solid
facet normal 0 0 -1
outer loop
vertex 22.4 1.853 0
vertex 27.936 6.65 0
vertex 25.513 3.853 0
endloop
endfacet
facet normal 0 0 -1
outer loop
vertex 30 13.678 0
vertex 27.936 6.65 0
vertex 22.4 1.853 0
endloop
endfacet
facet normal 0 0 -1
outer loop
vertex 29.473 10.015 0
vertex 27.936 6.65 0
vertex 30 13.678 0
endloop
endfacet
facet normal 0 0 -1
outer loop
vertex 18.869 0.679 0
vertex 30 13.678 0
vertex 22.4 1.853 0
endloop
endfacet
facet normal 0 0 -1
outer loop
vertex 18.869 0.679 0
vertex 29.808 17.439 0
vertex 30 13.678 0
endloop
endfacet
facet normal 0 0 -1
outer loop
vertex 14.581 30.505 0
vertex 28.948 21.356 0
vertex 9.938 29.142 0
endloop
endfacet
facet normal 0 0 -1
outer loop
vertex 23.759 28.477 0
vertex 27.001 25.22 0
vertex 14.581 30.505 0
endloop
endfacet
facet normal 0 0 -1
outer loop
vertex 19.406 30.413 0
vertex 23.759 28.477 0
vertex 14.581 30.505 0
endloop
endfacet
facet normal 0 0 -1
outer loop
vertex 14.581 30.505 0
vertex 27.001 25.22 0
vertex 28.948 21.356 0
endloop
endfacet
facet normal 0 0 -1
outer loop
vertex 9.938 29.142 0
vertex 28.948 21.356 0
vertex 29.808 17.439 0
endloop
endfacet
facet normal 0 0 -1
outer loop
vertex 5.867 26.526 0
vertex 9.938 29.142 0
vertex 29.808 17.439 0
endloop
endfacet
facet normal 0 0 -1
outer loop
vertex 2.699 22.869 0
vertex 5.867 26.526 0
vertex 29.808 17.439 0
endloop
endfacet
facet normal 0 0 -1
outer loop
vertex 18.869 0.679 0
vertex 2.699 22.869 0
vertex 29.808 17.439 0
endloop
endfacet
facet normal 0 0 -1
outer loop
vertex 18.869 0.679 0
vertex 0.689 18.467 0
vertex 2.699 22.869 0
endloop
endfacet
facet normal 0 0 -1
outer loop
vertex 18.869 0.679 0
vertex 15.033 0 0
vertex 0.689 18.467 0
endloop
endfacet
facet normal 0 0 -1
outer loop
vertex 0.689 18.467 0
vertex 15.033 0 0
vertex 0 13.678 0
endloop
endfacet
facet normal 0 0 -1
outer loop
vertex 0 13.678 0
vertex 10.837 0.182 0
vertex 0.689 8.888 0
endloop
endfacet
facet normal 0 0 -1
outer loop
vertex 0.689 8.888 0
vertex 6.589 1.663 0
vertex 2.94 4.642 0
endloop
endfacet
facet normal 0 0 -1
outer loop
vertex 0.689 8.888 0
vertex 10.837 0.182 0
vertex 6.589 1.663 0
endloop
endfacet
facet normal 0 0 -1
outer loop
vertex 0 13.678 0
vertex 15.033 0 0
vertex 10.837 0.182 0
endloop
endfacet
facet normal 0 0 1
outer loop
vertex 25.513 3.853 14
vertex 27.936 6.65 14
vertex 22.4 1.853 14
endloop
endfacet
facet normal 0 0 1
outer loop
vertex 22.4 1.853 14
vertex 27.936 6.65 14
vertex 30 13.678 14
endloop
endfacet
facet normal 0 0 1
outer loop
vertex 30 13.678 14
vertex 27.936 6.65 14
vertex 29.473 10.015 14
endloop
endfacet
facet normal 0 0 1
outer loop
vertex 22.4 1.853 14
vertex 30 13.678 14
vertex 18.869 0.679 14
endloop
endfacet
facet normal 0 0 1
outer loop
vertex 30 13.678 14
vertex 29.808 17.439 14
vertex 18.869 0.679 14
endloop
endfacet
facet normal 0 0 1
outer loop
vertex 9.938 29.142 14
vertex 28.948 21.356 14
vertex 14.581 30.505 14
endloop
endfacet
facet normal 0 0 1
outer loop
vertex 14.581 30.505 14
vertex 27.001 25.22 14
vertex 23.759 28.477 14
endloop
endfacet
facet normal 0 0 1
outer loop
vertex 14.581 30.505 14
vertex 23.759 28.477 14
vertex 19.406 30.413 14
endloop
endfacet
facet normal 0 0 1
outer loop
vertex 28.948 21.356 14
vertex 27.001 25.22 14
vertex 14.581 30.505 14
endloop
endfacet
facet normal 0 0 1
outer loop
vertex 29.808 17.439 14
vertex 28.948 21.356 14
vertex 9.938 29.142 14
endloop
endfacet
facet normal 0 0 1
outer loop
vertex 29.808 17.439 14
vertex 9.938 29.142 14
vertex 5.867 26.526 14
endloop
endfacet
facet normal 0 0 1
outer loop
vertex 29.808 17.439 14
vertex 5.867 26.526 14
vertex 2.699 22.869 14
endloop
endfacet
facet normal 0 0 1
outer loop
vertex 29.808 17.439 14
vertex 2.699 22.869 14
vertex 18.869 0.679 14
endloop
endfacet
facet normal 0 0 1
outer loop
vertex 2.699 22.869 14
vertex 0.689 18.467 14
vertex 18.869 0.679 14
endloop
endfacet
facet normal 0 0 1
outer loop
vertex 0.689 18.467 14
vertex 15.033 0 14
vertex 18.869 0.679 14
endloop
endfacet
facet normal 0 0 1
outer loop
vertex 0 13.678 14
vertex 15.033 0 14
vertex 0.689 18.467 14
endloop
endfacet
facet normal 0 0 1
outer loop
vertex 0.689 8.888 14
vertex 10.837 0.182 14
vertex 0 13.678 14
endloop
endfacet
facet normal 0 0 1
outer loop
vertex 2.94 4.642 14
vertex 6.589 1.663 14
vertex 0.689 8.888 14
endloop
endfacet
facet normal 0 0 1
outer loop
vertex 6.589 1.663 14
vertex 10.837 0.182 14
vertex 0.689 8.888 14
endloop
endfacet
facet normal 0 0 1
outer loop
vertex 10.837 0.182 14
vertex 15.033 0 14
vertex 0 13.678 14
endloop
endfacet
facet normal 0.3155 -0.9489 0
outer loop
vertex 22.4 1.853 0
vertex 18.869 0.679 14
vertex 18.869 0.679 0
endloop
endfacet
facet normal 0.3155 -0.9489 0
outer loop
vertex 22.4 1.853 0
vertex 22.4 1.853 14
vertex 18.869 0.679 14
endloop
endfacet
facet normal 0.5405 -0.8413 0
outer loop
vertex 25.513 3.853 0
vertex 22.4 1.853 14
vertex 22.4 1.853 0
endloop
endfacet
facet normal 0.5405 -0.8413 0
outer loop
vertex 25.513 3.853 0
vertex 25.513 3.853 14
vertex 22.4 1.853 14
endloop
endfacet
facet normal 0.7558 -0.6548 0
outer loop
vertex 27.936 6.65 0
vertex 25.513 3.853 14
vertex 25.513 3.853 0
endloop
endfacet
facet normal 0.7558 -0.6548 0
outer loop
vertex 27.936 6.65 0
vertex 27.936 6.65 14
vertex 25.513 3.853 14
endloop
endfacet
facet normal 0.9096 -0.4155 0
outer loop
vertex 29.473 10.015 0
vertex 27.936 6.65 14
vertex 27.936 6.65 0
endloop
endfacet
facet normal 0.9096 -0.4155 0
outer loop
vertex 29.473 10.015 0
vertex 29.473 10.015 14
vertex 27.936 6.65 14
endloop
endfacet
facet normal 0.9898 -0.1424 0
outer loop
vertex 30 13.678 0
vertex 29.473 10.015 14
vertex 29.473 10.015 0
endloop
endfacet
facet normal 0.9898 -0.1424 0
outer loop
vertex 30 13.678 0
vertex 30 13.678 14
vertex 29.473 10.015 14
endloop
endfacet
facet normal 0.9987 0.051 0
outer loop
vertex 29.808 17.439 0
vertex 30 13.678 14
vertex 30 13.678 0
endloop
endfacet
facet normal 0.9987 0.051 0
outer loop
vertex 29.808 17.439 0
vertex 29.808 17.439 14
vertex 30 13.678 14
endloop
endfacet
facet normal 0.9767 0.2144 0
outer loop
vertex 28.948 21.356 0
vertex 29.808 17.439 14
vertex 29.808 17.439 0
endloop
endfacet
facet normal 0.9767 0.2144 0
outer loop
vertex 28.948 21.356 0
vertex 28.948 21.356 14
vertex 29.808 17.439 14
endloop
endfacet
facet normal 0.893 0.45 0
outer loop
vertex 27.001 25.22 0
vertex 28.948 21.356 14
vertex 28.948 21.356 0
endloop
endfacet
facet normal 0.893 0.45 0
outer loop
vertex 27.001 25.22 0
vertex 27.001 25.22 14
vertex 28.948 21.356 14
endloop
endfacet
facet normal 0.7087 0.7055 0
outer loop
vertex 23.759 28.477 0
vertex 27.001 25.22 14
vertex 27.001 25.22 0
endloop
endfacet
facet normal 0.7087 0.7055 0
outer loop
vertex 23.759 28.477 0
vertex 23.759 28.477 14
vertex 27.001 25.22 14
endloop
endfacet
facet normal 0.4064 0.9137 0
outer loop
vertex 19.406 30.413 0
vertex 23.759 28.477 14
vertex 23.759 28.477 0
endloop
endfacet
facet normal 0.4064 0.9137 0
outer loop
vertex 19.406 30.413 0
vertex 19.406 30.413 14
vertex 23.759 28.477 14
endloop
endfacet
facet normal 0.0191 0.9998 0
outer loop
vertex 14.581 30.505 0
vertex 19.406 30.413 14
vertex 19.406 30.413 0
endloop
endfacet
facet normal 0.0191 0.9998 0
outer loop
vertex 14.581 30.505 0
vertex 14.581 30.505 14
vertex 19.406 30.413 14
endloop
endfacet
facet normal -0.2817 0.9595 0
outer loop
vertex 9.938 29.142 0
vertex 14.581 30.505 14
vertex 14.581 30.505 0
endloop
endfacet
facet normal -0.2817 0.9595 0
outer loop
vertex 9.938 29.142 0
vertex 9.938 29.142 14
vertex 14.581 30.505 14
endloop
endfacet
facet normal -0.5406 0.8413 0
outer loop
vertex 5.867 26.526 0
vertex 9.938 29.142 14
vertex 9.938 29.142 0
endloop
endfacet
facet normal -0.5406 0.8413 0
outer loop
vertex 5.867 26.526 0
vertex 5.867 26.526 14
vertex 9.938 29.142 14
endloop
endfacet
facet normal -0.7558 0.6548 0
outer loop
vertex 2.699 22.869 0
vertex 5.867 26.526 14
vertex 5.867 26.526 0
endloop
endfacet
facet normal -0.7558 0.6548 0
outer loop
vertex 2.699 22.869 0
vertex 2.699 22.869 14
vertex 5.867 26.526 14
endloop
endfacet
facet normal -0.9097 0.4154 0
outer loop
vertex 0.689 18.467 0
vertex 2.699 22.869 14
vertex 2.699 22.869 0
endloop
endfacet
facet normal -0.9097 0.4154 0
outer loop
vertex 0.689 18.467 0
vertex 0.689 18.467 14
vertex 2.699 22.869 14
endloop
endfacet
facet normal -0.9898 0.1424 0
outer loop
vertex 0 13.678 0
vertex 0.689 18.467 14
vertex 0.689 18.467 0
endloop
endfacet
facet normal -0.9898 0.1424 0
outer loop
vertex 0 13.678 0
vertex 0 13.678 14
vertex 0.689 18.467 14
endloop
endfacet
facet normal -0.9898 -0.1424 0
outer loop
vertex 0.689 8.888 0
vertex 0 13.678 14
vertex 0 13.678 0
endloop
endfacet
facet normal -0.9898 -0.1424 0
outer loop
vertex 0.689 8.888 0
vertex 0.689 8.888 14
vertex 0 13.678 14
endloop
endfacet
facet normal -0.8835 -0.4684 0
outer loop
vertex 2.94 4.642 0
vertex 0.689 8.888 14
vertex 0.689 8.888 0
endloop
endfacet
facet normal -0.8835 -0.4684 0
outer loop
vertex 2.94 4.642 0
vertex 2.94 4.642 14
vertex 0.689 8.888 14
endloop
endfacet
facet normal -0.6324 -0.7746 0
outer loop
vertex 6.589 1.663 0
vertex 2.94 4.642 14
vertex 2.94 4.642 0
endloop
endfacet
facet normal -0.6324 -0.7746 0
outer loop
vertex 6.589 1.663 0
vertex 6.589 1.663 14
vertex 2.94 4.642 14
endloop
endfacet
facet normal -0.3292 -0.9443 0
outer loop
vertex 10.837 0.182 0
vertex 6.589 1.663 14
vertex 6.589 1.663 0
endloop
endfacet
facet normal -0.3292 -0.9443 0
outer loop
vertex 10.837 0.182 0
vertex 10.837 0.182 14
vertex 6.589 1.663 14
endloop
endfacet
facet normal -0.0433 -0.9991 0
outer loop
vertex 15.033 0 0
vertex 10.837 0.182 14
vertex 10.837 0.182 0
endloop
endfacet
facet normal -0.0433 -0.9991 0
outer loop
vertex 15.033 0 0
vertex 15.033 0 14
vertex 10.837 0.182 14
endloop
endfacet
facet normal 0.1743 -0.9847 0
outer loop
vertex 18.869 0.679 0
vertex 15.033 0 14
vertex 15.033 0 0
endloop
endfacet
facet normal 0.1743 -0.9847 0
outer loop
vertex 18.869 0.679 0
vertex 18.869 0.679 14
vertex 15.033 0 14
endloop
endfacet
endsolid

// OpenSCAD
$fn = 32;

// ----------------------------------------------------------------------
// Cam disc: base radius 13.0 mm, lift 4.0 mm, 22 profile points
// ----------------------------------------------------------------------

// --- parameters (mm) ---
profile_height = 14;      // extrusion height
profile_points = 22;      // points of the closed outline

profile = [[30, 13.678], [29.808, 17.439], [28.948, 21.356], [27.001, 25.22], [23.759, 28.477], [19.406, 30.413], [14.581, 30.505], [9.938, 29.142], [5.867, 26.526], [2.699, 22.869], [0.689, 18.467], [0, 13.678], [0.689, 8.888], [2.94, 4.642], [6.589, 1.663], [10.837, 0.182], [15.033, 0], [18.869, 0.679], [22.4, 1.853], [25.513, 3.853], [27.936, 6.65], [29.473, 10.015]];  // single closed polygon, 22 points, counter clockwise

// --- the one profile operation ---
linear_extrude(height = profile_height) polygon(points = profile);
